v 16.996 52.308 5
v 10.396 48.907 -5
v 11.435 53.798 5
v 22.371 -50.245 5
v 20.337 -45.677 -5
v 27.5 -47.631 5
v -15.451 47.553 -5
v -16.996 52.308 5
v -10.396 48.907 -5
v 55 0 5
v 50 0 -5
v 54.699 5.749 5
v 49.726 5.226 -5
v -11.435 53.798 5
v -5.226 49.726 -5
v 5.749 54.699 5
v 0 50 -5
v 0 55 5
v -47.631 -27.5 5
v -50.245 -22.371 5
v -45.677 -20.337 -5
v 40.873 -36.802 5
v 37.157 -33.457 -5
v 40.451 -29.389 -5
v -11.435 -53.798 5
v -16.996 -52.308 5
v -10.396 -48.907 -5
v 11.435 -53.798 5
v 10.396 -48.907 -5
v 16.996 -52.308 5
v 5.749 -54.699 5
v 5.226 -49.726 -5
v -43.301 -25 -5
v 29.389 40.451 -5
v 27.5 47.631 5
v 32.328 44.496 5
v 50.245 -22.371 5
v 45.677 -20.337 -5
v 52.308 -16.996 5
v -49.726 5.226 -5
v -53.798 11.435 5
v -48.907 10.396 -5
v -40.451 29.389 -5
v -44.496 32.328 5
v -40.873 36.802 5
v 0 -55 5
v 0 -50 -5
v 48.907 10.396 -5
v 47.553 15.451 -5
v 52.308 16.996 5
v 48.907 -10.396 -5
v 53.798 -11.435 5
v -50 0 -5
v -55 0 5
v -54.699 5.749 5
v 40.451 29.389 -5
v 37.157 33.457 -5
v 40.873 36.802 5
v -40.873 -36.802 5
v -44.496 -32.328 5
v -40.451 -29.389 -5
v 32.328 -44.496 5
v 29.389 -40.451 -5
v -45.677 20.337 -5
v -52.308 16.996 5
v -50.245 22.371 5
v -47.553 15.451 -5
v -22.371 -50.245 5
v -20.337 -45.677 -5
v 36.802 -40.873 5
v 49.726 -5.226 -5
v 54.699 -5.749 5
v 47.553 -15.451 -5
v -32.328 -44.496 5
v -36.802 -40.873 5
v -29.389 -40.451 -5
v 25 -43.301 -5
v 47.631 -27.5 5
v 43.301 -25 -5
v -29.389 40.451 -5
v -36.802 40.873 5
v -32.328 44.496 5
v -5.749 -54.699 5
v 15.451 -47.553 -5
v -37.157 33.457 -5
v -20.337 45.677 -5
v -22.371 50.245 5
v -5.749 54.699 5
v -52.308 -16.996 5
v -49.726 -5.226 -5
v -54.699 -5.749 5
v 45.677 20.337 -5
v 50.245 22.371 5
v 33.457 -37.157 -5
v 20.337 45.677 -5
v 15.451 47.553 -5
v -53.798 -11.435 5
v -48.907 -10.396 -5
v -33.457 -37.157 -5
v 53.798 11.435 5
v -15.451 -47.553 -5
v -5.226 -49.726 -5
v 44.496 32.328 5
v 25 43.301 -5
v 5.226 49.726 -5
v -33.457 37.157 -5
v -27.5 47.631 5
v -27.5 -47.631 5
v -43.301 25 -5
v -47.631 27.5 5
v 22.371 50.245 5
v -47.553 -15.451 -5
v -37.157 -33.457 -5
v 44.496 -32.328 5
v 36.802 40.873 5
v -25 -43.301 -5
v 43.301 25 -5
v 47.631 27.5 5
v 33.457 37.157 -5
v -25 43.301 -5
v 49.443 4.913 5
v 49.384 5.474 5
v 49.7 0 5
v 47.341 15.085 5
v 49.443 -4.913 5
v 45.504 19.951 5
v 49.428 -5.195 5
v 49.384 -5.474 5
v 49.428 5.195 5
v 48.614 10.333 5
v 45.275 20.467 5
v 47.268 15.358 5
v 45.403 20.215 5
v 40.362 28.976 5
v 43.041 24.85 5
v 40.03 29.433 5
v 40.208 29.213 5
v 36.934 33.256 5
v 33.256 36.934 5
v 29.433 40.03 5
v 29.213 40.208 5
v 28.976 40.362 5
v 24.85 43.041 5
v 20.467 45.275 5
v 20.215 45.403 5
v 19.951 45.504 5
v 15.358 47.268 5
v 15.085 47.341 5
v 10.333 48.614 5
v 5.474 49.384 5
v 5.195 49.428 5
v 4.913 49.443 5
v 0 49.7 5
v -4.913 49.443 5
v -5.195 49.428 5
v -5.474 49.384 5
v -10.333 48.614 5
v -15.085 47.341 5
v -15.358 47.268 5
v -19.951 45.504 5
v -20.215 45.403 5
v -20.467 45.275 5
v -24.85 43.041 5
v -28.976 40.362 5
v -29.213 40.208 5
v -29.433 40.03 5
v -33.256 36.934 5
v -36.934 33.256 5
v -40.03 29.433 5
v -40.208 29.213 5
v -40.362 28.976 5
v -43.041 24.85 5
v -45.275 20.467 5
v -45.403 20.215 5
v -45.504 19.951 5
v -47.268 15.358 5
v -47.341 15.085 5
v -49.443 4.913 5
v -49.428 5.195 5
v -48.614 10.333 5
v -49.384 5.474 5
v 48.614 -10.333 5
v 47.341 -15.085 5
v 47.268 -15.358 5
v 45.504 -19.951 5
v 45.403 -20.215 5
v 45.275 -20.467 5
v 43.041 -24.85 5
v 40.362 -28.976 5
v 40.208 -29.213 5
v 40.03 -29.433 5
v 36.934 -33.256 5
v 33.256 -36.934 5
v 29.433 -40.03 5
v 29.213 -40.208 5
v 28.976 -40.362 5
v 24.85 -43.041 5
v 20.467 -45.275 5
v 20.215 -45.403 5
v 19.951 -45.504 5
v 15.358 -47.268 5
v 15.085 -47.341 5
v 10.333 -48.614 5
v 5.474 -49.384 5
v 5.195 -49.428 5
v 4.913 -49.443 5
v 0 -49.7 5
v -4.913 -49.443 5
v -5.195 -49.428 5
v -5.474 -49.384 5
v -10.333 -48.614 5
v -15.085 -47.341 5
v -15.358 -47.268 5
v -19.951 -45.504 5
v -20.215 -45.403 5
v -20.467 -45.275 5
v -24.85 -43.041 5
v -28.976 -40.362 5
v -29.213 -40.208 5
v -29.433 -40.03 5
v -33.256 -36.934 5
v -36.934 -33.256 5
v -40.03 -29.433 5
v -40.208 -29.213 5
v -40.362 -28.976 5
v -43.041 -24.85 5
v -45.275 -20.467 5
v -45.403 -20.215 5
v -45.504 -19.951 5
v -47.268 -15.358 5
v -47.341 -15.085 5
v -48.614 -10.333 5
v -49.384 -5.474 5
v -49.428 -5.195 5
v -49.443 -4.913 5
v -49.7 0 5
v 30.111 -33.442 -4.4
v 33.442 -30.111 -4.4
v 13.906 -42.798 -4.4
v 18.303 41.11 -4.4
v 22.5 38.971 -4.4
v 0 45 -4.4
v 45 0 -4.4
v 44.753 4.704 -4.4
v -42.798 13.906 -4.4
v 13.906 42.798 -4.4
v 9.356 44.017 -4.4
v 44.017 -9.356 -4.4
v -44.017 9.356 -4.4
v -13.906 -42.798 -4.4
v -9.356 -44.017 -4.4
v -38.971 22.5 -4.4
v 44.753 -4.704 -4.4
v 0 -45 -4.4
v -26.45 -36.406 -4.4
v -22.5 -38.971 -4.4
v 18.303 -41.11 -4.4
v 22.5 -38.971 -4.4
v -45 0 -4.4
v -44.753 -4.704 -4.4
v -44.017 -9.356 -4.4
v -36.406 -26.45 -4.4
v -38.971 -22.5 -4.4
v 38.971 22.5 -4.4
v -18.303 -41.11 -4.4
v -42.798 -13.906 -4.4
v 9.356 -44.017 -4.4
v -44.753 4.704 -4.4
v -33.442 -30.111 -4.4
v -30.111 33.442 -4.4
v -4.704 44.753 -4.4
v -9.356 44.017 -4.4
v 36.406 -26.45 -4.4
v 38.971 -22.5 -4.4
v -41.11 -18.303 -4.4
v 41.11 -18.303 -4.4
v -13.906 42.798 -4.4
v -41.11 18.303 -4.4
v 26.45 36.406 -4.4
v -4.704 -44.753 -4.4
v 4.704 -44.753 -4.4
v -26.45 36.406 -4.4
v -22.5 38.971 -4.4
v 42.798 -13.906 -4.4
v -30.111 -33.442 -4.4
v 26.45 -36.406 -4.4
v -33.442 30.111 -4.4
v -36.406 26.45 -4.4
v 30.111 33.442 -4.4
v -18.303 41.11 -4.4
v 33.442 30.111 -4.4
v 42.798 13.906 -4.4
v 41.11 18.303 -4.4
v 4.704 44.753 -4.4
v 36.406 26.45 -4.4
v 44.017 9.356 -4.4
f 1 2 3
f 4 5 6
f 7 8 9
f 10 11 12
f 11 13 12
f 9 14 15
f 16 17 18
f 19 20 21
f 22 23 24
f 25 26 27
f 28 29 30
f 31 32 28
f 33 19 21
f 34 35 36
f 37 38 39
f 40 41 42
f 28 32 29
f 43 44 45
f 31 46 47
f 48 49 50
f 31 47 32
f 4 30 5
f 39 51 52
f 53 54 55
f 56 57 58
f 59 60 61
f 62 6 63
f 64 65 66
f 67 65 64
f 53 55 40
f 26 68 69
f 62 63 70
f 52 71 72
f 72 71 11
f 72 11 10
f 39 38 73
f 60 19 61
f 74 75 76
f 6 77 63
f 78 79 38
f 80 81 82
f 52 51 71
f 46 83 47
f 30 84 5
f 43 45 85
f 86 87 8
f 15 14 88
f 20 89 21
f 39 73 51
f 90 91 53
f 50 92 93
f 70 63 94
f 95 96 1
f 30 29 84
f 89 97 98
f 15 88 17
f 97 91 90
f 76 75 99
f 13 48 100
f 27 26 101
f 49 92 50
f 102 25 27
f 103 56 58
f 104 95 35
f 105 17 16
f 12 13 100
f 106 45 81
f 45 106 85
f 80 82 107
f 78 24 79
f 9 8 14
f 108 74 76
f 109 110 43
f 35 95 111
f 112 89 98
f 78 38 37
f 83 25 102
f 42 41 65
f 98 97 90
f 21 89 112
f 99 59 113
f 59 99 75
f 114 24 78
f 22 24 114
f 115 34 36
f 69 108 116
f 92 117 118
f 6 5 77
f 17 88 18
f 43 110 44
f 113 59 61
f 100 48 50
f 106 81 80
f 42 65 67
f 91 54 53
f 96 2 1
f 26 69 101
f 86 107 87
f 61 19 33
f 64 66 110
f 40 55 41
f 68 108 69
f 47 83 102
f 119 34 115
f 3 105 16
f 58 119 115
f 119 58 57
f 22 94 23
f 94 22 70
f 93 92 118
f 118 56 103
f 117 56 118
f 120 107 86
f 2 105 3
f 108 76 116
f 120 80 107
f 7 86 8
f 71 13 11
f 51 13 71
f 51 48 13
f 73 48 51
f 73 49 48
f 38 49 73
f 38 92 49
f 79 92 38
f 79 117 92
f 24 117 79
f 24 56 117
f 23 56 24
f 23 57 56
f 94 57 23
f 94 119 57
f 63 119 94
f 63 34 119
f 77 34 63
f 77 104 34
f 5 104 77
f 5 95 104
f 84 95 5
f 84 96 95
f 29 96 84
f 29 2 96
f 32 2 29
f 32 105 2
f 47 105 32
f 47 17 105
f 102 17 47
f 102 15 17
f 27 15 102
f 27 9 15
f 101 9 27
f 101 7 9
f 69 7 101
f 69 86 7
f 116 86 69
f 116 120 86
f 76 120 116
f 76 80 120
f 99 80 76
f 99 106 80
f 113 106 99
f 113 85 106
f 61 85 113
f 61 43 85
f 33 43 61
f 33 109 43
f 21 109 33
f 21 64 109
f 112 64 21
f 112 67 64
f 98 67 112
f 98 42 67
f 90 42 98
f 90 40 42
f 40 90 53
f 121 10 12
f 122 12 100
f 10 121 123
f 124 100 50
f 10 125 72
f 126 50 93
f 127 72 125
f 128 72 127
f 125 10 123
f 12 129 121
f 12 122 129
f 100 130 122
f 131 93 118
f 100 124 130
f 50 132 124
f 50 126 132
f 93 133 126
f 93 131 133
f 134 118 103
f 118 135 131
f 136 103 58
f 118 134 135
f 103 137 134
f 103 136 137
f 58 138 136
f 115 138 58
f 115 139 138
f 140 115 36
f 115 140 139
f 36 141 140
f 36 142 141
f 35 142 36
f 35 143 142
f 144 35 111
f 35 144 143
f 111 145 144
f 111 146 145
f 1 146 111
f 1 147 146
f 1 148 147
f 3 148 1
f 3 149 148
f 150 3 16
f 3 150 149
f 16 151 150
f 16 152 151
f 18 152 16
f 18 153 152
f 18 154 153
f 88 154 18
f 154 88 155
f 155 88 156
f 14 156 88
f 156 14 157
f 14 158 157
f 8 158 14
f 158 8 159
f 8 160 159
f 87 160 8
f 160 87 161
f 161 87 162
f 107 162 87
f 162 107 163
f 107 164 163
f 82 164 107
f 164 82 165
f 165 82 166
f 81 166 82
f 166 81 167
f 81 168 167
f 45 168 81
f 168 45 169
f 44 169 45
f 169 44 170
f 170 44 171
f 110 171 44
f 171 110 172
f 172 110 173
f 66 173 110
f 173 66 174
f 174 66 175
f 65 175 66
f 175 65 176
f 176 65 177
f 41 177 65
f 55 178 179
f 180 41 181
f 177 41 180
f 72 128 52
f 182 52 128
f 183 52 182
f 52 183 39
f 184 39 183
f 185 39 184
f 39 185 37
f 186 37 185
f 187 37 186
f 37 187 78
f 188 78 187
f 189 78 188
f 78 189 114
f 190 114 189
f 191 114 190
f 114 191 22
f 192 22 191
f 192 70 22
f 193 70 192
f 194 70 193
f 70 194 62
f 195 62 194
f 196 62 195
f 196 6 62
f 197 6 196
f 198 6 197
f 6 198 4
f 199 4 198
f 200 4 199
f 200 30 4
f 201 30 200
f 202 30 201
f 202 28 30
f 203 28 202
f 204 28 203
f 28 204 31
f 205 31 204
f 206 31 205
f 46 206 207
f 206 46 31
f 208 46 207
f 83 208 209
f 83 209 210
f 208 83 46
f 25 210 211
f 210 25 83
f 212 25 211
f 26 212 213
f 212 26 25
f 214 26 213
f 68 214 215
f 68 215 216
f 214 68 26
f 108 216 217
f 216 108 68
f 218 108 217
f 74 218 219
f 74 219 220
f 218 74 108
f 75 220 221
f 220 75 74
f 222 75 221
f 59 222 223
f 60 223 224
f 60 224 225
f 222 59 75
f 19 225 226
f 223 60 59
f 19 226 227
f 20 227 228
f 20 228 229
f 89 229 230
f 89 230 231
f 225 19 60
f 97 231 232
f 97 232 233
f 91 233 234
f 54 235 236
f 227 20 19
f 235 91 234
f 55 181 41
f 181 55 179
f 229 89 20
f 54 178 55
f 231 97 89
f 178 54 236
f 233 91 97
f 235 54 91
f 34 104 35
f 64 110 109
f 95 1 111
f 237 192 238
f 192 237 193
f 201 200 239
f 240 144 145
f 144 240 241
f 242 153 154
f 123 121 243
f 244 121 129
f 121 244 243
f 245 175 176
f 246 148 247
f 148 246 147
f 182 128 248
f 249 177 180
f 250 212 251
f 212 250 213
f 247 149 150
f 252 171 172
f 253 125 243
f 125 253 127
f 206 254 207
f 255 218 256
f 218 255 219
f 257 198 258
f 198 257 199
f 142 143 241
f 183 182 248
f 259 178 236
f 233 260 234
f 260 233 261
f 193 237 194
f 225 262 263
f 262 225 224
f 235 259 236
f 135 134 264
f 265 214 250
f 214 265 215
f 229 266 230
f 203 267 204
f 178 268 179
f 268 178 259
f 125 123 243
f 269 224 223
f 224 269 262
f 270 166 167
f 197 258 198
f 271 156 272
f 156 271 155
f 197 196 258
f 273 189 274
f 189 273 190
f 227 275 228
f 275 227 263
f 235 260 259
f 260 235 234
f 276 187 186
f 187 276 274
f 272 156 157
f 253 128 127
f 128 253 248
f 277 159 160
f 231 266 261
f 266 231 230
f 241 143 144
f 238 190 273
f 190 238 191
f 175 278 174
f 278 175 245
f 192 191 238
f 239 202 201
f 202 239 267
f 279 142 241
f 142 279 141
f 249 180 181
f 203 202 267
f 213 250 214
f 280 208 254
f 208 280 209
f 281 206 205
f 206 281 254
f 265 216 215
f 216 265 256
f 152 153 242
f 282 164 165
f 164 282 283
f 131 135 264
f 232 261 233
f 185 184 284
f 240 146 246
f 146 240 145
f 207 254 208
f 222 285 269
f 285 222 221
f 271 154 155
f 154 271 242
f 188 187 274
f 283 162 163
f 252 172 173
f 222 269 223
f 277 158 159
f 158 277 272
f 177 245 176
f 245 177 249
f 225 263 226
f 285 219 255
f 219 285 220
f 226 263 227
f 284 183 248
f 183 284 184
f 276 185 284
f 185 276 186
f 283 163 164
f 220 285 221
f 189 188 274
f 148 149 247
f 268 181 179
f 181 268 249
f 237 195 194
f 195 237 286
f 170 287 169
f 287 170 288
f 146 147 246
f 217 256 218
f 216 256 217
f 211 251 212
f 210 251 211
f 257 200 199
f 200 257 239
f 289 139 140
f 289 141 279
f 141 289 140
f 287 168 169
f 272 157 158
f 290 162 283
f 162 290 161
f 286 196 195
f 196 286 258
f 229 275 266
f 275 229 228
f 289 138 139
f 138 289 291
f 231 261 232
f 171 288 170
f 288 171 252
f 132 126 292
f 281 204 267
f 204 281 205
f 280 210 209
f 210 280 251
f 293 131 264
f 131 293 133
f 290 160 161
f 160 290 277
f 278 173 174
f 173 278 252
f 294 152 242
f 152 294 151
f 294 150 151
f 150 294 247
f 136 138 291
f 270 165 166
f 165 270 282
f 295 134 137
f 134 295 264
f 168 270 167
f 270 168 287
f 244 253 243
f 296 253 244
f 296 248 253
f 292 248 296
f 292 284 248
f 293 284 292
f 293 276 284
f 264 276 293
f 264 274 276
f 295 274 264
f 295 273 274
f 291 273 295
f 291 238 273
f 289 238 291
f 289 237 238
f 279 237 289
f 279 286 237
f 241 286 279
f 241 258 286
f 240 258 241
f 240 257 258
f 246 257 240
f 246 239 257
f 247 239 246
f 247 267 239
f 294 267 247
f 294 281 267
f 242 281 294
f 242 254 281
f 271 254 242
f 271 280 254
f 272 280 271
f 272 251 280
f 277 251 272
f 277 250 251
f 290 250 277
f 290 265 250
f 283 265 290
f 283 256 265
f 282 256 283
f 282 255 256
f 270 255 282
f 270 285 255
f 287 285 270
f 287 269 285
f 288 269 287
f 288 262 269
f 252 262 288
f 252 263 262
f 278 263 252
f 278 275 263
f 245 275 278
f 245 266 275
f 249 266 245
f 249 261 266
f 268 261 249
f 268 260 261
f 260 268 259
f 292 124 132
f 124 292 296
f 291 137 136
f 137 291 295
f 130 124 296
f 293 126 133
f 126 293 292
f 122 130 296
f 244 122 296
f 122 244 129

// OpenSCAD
$fn=60;

difference() {
  cylinder(r1=50, r2=55, h=10, center=true);

  translate([0, 0, 0.6]) {
    cylinder(r1=45, r2=50, h=10, center=true);
  }
}
